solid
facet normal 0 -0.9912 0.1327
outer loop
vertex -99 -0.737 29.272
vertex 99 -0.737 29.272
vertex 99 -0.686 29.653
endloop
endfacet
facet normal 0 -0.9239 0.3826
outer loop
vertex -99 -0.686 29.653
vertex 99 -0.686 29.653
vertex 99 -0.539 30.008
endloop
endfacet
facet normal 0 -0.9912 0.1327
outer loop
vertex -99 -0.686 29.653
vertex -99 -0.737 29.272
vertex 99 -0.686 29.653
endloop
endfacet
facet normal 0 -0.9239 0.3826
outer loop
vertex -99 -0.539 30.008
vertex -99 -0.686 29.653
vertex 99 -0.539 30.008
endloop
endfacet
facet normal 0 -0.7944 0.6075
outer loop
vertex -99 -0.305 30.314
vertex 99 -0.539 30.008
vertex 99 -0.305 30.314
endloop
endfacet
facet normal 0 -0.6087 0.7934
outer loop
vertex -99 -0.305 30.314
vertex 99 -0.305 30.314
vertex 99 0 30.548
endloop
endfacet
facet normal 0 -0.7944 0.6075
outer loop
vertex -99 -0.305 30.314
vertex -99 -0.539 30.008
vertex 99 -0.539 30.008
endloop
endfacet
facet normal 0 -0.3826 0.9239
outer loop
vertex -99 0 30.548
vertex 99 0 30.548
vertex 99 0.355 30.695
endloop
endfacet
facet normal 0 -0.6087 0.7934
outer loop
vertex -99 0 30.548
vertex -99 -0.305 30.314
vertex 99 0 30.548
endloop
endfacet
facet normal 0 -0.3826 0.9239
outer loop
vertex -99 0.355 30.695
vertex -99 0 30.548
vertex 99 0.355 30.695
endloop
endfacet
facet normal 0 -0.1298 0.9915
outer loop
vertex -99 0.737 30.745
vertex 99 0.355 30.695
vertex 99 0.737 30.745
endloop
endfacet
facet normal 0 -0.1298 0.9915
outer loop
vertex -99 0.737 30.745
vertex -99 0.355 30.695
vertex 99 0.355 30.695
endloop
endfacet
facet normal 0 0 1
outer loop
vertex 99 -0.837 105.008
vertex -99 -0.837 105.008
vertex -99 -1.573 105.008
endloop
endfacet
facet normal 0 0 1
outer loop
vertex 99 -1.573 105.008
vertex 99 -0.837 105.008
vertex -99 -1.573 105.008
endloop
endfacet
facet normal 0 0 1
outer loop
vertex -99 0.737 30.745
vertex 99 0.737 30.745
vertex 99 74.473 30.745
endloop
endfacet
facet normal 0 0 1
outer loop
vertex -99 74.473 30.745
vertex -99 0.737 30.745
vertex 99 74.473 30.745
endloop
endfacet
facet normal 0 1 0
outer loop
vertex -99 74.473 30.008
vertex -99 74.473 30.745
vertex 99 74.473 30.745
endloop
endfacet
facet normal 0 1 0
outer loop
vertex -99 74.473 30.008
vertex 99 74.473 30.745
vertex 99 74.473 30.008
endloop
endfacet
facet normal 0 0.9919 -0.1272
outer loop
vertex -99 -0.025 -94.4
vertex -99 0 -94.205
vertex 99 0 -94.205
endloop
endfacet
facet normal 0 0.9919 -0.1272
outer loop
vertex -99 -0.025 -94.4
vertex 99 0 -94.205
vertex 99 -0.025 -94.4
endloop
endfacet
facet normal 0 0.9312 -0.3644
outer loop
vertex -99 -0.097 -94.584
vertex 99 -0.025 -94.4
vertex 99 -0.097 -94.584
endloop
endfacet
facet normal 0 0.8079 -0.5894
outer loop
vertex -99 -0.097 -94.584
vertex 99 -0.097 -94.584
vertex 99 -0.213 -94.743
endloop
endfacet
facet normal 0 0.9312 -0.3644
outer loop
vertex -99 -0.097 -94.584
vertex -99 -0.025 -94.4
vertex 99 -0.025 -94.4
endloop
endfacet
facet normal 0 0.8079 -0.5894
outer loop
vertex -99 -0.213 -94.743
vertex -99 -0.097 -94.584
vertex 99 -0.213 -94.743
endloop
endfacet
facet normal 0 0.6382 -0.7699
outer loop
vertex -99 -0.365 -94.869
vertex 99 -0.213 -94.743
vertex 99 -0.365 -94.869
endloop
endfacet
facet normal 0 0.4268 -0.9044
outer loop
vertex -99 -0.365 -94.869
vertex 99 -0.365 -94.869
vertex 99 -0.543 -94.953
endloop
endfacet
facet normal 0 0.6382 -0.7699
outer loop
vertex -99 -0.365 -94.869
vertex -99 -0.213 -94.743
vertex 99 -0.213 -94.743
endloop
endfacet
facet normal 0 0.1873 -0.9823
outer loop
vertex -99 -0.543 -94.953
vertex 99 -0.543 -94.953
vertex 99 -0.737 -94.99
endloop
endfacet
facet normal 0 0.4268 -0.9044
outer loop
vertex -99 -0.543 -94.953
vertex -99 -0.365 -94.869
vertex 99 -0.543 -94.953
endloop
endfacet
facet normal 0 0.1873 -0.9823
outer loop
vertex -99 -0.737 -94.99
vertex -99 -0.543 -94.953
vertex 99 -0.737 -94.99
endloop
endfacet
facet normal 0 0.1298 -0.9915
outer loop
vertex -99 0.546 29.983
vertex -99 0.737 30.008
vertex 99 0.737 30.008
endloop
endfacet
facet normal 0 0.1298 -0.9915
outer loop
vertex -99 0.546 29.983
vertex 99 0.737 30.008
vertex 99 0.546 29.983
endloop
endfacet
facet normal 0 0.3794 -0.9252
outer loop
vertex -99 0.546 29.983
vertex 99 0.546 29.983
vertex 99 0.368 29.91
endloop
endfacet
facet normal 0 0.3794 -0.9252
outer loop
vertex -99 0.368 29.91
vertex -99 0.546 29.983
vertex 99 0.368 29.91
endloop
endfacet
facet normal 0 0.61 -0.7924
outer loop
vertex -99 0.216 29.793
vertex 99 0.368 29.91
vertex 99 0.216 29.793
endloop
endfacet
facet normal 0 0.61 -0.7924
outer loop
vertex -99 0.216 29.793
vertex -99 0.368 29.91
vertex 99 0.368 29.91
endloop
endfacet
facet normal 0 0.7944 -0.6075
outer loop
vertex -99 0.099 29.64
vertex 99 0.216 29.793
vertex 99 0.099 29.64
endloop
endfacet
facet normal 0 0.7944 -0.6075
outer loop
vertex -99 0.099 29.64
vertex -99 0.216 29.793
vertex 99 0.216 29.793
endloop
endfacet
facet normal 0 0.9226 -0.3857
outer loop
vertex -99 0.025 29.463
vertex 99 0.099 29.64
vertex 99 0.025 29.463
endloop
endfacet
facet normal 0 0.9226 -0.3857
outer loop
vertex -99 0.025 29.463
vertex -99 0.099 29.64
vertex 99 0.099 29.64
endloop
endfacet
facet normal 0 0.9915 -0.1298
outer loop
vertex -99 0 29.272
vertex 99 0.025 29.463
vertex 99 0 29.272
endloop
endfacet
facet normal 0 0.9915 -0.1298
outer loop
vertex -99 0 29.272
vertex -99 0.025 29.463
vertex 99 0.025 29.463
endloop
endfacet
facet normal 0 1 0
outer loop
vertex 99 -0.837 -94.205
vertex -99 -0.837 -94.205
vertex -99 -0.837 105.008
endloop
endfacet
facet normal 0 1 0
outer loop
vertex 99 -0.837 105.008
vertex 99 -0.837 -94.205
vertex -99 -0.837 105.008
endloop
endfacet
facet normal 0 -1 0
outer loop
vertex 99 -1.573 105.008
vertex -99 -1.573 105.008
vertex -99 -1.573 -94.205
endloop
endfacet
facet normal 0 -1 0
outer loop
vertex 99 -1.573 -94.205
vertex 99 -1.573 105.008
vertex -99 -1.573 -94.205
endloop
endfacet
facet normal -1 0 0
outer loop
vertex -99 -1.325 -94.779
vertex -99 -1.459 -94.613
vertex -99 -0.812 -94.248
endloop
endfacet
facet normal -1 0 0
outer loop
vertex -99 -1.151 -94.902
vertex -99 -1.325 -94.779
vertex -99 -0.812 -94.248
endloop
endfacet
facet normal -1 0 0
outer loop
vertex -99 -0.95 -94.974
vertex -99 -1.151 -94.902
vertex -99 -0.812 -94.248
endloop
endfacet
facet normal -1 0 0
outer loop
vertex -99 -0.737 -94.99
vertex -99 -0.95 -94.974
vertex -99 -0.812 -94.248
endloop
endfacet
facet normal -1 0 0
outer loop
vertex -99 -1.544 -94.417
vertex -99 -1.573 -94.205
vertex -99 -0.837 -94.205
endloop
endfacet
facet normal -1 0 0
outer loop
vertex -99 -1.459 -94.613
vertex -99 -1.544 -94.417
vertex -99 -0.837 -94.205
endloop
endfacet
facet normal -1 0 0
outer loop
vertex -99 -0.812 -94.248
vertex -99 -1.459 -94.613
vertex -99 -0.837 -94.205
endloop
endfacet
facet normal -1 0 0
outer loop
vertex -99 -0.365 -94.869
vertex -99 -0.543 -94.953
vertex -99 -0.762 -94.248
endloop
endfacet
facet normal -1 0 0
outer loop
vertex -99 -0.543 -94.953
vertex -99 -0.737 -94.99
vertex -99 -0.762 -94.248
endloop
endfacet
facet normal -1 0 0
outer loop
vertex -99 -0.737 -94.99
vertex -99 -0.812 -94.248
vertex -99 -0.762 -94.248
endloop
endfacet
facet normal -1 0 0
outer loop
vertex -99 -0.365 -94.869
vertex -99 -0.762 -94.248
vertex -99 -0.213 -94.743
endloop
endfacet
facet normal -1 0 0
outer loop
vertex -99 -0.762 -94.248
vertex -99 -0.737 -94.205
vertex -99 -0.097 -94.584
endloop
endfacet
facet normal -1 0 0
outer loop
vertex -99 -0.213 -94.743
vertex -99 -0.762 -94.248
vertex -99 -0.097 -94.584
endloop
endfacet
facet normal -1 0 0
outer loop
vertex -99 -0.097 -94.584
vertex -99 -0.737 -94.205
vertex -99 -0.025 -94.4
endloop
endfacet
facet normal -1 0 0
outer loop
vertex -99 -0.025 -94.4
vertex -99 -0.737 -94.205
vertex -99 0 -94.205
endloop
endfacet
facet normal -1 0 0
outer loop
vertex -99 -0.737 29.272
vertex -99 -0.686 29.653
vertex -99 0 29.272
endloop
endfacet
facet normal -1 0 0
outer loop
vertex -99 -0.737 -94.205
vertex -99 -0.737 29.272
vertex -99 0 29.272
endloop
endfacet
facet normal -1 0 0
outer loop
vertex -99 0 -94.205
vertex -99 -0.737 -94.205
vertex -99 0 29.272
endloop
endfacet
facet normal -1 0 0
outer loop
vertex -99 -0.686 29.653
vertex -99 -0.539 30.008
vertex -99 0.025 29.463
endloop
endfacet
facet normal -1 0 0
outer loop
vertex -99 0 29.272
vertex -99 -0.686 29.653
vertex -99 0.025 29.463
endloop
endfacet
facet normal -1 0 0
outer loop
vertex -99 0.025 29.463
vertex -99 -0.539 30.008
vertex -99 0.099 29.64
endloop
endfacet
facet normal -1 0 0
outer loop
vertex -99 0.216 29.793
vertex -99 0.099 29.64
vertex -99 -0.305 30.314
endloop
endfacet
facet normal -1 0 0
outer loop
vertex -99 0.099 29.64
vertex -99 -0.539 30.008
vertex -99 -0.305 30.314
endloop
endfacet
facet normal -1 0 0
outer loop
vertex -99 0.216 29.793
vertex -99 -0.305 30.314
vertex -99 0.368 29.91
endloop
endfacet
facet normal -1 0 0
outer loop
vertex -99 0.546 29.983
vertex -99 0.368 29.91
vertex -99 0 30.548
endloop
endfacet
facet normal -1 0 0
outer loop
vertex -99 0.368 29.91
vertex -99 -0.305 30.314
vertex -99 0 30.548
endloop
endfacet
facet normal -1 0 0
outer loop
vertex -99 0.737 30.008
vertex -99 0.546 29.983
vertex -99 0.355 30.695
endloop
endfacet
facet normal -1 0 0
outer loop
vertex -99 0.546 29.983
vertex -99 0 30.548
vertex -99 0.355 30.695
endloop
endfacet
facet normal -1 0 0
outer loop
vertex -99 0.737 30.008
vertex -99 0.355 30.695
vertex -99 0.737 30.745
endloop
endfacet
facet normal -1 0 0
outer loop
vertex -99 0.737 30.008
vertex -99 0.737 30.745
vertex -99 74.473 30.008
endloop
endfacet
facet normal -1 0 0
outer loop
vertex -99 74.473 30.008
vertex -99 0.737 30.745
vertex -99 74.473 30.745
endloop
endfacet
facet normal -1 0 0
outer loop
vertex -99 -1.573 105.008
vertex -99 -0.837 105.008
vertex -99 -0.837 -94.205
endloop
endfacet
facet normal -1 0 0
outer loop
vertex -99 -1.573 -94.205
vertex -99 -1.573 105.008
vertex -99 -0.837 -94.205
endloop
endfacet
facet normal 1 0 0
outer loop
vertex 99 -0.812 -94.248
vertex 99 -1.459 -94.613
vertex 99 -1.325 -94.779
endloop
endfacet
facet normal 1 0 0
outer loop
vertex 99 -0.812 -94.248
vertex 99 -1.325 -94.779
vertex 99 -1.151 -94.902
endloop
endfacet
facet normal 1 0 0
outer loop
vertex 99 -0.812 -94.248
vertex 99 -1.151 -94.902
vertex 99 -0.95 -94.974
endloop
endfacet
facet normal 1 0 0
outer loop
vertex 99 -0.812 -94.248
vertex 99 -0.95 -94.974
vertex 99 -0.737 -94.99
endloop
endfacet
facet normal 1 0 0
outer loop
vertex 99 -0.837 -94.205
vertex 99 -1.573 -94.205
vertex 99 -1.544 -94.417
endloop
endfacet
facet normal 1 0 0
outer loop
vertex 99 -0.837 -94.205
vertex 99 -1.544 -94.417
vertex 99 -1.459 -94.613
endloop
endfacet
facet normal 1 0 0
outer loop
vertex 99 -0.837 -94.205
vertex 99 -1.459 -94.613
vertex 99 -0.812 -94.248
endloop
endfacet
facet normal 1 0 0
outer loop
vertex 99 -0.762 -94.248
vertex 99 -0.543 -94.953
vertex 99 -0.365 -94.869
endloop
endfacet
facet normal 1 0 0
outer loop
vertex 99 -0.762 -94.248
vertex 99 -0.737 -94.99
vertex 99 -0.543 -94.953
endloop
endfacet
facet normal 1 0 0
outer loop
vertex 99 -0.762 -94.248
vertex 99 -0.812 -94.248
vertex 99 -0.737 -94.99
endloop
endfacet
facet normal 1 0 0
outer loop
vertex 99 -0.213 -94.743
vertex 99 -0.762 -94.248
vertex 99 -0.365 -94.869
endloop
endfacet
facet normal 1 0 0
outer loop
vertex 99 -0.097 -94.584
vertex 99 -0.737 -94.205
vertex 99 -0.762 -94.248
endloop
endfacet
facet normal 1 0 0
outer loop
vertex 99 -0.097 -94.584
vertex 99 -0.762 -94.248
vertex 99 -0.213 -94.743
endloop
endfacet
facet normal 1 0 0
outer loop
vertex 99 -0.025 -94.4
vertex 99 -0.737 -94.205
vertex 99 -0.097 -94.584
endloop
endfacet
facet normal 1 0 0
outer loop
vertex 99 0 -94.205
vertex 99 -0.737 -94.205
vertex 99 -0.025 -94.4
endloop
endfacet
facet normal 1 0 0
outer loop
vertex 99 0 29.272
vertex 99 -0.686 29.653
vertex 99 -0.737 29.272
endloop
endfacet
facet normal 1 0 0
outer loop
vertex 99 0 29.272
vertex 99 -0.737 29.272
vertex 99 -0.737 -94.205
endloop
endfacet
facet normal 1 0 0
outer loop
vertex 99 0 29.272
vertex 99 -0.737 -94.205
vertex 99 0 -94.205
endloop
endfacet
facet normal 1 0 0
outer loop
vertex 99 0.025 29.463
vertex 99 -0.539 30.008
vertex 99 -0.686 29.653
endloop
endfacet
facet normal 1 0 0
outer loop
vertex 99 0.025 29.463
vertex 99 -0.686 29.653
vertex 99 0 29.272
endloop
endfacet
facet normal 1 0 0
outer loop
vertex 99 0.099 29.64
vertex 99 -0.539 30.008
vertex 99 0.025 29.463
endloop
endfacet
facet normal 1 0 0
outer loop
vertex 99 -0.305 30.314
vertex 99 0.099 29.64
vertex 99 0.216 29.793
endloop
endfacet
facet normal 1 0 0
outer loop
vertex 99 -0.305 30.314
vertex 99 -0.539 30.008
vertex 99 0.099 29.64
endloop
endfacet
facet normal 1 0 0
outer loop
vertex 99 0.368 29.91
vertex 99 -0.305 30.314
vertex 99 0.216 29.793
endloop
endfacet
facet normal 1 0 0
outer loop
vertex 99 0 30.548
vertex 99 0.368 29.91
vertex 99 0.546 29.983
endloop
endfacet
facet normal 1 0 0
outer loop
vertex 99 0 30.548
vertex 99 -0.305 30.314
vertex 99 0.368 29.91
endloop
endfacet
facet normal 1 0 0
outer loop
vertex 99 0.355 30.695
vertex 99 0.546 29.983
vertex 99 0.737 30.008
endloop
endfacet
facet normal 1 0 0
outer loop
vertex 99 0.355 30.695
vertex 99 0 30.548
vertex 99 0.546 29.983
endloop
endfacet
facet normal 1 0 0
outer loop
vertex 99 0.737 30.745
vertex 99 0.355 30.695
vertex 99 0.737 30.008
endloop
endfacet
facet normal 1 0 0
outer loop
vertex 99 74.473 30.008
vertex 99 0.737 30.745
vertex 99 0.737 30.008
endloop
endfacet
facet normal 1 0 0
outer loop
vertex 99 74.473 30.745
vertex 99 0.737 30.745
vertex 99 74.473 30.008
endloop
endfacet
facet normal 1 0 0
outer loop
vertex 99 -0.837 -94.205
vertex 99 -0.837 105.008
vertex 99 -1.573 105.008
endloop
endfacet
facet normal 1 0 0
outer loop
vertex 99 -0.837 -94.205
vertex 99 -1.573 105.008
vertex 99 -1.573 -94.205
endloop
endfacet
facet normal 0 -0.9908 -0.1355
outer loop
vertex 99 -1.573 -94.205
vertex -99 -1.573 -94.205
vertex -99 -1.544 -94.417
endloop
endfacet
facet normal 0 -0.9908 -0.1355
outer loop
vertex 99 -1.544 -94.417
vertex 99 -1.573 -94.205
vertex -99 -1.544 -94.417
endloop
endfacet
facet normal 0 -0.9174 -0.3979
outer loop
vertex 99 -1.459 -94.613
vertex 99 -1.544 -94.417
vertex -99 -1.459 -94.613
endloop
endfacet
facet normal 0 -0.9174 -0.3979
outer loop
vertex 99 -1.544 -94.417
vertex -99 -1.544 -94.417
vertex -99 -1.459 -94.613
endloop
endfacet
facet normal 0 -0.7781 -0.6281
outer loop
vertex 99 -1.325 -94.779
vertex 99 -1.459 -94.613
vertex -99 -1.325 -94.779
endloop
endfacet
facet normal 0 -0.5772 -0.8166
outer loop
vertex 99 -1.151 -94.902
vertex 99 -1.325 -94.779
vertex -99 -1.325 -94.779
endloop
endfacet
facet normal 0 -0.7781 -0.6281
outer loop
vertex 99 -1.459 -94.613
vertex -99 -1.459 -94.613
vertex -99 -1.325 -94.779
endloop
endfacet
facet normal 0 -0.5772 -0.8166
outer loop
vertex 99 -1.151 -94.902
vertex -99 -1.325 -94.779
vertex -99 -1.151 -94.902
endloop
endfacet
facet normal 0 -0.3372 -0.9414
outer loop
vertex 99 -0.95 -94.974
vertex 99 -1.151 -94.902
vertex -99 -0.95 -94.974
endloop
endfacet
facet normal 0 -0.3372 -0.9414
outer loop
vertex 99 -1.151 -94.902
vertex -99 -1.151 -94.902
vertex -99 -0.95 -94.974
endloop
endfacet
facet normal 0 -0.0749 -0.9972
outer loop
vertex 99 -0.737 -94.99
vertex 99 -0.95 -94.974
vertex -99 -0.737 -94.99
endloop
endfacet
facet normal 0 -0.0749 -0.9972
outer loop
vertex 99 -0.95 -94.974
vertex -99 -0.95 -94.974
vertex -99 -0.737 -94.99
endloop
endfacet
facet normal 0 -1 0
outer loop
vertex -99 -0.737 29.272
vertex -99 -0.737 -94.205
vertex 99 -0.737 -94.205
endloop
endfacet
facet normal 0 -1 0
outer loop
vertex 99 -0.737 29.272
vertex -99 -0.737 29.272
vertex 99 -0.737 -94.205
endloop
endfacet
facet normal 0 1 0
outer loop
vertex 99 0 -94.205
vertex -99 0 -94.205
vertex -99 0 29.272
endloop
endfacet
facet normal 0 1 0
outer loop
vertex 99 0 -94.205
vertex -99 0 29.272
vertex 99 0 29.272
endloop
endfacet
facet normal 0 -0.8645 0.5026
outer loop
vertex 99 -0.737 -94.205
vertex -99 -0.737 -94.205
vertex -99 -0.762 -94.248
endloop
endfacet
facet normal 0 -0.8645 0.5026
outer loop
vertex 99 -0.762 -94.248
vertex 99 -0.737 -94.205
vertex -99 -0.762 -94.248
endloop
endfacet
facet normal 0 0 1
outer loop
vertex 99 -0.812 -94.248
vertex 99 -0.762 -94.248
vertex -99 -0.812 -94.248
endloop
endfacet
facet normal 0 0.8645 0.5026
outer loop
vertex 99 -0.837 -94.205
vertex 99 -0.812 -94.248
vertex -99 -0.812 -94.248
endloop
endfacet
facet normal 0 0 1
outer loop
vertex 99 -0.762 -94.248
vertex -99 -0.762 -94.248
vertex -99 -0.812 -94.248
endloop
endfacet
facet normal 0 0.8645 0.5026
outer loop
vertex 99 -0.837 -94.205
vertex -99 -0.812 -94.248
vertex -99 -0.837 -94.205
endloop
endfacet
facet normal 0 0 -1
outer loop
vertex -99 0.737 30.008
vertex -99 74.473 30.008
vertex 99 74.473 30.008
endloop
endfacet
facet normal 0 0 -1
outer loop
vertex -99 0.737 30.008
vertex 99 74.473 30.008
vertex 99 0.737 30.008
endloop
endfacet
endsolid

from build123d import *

# Parameters (mm, degrees)
SKETCH1_W                    = 198
SKETCH1_H                    = 125
BASE_FLANGE1_DEPTH           = 0.7366
EDGE_FLANGE1_STRIP_W         = 4.4196
EDGE_FLANGE1_STRIP_H         = 0.7366
EDGE_FLANGE1_STRIP_CUT_DEPTH = 198
EDGE_FLANGE1_DEPTH           = 198
HEM1_START                   = -99
HEM1_DEPTH                   = 198
HEM1_2_DEPTH                 = 198


with BuildPart() as part:
    # Base-Flange1: sheet metal written as solids
    # Sketch1 → Base-Flange1 (new body)
    with BuildSketch(Plane(origin=(0, 0, 0), x_dir=(1, 0, 0), z_dir=(0, 1, 0))):
        with Locations((0, 32.491501416)):
            Rectangle(SKETCH1_W, SKETCH1_H)
    extrude(amount=-BASE_FLANGE1_DEPTH)

    # Edge-Flange1: sheet metal written as solids
    # Edge-Flange1 strip (on a plane across the edge) → Edge-Flange1 strip cut (cut)
    with BuildSketch(Plane(origin=(-99, 0, 30.008498584), x_dir=(0, 0, -1), z_dir=(1, 0, 0))):
        with Locations((-1.4732, -0.3683)):
            Rectangle(EDGE_FLANGE1_STRIP_W, EDGE_FLANGE1_STRIP_H)
    extrude(amount=EDGE_FLANGE1_STRIP_CUT_DEPTH, mode=Mode.SUBTRACT)

    # Edge-Flange1 section (on a plane across the edge) → Edge-Flange1 (add)
    with BuildSketch(Plane(origin=(-99, 0, 30.008498584), x_dir=(0, 0, -1), z_dir=(1, 0, 0))):
        with BuildLine():
            Line((-0.7366, 0.7366), (-0.7366, 74.4732))
            Line((-0.7366, 74.4732), (0, 74.4732))
            Line((0, 74.4732), (0, 0.7366))
            ThreePointArc((0, 0.7366), (0.215745145, 0.215745145), (0.7366, 0))
            Line((0.7366, 0), (0.7366, -0.7366))
            ThreePointArc((0.7366, -0.7366), (-0.30510971, -0.30510971), (-0.7366, 0.7366))
        make_face()
    extrude(amount=EDGE_FLANGE1_DEPTH)

    # Hem1: read off the stored shape, not the designer's step
    # Hem1 outline → Hem1 (cut)
    with BuildSketch(Plane.YZ.offset(HEM1_START)):
        with BuildLine():
            ThreePointArc((0, -94.204901416), (-0.212984467, -94.743143722), (-0.7366, -94.98991069))
            Line((-0.7366, -94.98991069), (-0.7366, -94.991501416))
            Line((-0.7366, -94.991501416), (0, -94.991501416))
            Line((0, -94.991501416), (0, -94.204901416))
        make_face()
    extrude(amount=HEM1_DEPTH, mode=Mode.SUBTRACT)

    # Hem1 2 outline → Hem1 2 (add)
    with BuildSketch(Plane.YZ.offset(HEM1_START)):
        with BuildLine():
            Line((-0.8366, 105.008498584), (-1.5732, 105.008498584))
            Line((-1.5732, 105.008498584), (-1.5732, -94.204901416))
            ThreePointArc((-1.5732, -94.204901416), (-1.324842306, -94.778516949), (-0.7366, -94.98991069))
            Line((-0.7366, -94.98991069), (-0.7366, -94.204901416))
            ThreePointArc((-0.7366, -94.204901416), (-0.7866, -94.254901416), (-0.8366, -94.204901416))
            Line((-0.8366, -94.204901416), (-0.8366, 105.008498584))
        make_face()
    extrude(amount=HEM1_2_DEPTH)


solid = part.part
